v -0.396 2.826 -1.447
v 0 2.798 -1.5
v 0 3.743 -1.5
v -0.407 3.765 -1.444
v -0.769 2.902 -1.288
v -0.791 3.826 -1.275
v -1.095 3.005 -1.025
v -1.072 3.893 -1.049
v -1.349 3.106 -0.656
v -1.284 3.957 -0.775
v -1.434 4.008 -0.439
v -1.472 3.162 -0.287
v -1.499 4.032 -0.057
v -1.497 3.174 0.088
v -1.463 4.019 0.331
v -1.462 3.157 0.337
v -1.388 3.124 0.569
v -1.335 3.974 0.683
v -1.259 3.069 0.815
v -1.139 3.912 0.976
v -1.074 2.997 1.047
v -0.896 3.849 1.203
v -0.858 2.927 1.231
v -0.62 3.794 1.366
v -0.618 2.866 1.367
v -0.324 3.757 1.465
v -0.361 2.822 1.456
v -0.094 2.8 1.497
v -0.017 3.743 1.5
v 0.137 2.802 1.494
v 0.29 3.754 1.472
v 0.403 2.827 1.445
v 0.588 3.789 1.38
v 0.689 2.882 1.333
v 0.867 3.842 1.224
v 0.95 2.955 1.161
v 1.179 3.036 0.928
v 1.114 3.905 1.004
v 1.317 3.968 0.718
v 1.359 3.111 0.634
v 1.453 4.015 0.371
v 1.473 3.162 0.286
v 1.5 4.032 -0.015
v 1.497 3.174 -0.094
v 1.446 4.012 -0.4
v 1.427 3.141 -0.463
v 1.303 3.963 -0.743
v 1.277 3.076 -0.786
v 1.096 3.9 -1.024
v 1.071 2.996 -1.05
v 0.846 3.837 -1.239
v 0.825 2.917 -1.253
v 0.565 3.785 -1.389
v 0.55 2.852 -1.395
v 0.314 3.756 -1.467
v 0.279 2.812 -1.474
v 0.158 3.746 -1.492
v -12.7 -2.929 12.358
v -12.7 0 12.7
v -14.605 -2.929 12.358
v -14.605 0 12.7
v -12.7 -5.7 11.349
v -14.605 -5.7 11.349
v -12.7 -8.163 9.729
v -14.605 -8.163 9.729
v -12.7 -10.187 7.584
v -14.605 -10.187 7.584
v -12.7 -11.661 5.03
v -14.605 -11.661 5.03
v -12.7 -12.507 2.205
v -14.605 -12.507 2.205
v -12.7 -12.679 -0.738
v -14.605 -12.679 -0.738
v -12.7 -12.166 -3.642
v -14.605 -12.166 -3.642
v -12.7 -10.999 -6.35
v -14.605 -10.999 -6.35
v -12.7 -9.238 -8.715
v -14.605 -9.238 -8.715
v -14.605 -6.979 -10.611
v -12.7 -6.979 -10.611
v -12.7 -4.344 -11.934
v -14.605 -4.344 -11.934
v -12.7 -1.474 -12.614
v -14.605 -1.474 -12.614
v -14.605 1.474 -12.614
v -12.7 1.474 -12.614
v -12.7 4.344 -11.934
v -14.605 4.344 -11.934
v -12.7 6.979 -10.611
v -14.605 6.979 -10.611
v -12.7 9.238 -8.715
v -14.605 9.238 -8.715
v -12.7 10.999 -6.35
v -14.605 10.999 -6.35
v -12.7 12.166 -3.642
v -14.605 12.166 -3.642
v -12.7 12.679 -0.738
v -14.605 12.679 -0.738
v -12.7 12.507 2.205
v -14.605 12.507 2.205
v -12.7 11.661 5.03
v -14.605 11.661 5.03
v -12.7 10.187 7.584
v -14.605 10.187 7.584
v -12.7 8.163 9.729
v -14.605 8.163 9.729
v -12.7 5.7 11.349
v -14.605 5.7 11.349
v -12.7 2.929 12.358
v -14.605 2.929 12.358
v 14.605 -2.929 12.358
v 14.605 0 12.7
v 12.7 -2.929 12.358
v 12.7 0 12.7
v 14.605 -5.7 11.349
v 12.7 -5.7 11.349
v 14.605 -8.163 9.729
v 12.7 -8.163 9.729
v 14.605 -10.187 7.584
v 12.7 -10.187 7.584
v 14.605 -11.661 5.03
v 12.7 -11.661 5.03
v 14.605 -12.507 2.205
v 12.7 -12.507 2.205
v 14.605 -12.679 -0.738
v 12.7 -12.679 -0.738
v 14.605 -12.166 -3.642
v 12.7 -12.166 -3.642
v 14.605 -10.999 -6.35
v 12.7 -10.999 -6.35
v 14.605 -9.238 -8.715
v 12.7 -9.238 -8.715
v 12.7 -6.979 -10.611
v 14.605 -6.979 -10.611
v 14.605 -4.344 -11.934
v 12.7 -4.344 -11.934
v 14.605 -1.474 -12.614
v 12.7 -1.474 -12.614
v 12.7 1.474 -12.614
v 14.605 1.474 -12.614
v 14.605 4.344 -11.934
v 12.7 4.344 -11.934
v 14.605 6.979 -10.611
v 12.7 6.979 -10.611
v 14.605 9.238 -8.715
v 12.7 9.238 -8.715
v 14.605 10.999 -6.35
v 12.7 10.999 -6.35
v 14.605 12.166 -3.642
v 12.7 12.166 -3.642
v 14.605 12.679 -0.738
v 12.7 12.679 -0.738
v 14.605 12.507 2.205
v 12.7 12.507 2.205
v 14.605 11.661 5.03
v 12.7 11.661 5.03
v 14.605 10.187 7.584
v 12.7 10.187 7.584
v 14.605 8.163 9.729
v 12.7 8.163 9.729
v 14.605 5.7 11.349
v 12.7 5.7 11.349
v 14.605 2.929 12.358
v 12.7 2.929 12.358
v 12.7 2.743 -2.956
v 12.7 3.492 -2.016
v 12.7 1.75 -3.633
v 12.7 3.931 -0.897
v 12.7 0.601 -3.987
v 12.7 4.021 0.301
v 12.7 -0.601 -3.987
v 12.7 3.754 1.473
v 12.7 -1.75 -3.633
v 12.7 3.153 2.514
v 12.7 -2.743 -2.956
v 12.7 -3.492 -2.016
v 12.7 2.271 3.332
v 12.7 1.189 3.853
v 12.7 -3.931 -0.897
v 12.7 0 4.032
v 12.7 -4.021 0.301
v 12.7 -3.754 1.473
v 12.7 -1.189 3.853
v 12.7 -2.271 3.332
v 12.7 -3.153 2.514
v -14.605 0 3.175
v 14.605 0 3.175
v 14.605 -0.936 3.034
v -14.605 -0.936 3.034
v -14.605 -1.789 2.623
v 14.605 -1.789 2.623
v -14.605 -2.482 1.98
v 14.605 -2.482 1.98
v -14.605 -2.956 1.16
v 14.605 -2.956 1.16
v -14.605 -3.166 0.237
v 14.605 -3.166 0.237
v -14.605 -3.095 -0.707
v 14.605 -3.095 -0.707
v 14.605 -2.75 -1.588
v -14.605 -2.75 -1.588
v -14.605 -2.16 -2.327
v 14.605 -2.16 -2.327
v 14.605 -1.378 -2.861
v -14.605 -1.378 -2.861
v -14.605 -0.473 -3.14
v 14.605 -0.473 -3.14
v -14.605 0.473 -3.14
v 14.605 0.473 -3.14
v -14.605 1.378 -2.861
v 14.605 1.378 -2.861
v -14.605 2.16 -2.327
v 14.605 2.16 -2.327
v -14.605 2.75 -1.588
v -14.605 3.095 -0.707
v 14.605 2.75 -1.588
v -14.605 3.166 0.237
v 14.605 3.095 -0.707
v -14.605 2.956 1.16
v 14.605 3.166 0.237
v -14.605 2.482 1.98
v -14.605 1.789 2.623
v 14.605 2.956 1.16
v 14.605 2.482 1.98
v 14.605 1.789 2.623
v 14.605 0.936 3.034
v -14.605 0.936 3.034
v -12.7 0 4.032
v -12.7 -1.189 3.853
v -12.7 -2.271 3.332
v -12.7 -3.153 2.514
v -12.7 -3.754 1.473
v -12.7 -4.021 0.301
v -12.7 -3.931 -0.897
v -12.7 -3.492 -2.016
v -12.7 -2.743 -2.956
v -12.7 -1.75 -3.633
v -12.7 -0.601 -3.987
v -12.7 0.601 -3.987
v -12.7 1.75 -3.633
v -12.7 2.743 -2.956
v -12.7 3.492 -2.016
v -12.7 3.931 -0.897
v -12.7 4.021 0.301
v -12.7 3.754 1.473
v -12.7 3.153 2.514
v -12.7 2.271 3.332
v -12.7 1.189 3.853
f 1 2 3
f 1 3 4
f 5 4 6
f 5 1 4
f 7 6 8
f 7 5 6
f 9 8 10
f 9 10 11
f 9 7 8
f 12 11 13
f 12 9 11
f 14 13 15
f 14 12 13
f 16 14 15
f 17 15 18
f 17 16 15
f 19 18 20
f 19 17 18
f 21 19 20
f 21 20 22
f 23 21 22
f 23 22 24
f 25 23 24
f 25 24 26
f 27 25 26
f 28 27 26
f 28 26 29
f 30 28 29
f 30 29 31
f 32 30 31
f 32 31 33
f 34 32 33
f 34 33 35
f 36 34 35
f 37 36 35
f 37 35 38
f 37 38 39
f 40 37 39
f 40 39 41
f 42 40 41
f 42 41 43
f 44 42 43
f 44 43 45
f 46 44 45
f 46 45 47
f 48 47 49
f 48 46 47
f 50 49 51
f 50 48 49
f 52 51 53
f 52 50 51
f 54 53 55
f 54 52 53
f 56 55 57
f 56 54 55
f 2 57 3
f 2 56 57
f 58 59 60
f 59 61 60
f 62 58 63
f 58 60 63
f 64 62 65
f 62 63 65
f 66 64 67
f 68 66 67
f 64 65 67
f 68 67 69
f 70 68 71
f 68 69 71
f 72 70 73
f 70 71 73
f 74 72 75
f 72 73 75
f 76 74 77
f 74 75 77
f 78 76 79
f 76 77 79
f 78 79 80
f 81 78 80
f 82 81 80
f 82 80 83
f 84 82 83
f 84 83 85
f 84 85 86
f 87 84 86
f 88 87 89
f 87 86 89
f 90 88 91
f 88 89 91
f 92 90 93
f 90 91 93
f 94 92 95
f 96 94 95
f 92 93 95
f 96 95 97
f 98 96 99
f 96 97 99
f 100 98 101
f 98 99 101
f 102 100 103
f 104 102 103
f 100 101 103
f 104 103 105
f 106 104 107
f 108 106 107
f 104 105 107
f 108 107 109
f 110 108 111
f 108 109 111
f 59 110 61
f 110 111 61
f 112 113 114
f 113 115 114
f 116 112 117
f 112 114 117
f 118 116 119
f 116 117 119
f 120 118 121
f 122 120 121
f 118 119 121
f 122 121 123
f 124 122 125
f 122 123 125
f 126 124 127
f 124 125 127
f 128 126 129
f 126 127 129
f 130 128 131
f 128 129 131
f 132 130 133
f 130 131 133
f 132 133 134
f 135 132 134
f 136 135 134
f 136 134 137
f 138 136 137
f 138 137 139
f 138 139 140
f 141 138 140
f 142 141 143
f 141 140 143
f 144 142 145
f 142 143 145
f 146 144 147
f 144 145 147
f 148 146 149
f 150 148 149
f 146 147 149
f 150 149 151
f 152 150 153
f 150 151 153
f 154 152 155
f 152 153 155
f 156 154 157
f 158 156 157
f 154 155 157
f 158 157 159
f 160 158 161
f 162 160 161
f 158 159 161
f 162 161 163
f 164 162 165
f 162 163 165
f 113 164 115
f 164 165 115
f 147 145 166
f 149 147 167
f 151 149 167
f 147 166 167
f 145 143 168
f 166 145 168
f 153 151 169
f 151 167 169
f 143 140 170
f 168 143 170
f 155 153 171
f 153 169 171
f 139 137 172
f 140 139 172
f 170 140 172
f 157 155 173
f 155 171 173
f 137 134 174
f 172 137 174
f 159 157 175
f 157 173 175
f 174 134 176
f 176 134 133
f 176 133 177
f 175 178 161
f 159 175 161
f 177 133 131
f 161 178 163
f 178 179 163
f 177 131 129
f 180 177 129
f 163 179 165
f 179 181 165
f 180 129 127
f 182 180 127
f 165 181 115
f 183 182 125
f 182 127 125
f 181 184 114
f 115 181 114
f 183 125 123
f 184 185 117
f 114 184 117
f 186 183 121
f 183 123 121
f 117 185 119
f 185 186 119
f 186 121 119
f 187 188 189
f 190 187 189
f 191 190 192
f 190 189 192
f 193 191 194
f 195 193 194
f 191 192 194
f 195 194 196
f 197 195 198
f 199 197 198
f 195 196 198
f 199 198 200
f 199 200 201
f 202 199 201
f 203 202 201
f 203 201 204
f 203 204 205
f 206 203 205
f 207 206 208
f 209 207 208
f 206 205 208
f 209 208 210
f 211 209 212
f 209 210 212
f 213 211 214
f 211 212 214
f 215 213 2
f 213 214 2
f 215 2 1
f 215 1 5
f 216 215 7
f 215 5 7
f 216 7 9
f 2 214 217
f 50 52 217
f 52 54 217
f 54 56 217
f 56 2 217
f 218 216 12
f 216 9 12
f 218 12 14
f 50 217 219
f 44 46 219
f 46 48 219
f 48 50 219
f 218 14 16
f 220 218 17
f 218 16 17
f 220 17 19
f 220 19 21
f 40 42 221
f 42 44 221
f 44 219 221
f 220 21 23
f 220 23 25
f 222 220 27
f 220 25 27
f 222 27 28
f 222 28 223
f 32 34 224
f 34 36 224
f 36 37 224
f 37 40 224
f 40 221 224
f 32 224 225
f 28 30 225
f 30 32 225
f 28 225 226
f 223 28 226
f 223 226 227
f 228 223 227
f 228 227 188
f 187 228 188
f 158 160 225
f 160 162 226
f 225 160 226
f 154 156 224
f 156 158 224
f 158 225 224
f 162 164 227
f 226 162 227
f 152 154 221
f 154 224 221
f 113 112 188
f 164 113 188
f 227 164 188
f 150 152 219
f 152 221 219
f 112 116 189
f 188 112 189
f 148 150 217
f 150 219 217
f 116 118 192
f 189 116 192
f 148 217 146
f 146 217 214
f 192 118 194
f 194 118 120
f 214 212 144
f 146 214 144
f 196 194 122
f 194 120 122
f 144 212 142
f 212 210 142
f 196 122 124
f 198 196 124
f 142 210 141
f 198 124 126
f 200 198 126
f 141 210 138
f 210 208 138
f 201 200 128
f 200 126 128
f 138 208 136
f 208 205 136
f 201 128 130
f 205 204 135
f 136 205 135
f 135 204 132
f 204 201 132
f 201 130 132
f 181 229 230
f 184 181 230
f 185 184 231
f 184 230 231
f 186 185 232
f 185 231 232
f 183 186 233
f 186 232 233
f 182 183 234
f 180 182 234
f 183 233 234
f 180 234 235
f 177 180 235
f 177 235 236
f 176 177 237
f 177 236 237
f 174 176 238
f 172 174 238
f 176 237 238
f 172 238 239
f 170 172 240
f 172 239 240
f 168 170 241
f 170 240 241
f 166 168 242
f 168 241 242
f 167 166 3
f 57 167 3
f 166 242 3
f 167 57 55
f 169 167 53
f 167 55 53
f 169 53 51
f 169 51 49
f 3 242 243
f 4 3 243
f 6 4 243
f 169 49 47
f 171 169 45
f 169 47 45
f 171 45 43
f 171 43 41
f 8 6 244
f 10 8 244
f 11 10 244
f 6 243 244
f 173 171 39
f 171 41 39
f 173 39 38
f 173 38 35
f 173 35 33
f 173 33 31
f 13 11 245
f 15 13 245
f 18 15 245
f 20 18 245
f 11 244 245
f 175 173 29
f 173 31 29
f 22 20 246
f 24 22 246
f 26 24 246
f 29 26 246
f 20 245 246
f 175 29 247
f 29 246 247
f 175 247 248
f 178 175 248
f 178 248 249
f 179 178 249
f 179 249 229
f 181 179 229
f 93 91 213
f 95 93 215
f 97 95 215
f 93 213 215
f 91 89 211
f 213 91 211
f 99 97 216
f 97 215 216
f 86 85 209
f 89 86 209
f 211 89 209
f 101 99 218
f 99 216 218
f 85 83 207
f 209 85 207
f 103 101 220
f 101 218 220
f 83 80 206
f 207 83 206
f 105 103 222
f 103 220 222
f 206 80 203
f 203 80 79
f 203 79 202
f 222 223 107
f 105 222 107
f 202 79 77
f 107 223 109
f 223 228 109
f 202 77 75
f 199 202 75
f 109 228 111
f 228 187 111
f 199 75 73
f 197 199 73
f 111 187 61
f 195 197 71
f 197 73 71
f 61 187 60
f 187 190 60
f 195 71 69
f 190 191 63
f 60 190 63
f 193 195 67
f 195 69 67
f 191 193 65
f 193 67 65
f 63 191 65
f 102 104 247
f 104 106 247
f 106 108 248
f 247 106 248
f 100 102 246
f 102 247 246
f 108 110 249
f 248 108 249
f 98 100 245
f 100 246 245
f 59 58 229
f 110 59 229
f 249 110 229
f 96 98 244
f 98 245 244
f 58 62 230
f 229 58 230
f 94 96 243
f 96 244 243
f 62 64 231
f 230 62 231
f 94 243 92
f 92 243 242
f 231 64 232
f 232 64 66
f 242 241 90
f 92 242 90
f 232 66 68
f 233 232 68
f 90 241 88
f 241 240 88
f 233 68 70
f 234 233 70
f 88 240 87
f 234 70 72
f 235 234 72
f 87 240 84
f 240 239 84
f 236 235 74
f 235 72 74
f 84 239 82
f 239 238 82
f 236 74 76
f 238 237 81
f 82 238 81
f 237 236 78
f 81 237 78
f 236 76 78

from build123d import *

# Parameters (mm, degrees)
SKETCH2_R          = 1.5
CUT_EXTRUDE1_DEPTH = 24.14921219


with BuildPart() as part:
    # Sketch1 → Revolve1 (revolve)
    with BuildSketch(Plane.XY):
        Polygon((14.605, 3.175), (14.605, 12.7), (12.7, 12.7), (12.7, 4.03225), (-12.7, 4.03225), (-12.7, 12.7), (-14.605, 12.7), (-14.605, 3.175), align=None)
    revolve(axis=Axis((-15.275524476, 0, 0), (1, 0, 0)))

    # Sketch2 → Cut-Extrude1 (cut, through all)
    with BuildSketch(Plane(origin=(0, 0, 0), x_dir=(1, 0, 0), z_dir=(0, 1, 0))):
        Circle(SKETCH2_R)
    extrude(amount=CUT_EXTRUDE1_DEPTH, mode=Mode.SUBTRACT)


solid = part.part
